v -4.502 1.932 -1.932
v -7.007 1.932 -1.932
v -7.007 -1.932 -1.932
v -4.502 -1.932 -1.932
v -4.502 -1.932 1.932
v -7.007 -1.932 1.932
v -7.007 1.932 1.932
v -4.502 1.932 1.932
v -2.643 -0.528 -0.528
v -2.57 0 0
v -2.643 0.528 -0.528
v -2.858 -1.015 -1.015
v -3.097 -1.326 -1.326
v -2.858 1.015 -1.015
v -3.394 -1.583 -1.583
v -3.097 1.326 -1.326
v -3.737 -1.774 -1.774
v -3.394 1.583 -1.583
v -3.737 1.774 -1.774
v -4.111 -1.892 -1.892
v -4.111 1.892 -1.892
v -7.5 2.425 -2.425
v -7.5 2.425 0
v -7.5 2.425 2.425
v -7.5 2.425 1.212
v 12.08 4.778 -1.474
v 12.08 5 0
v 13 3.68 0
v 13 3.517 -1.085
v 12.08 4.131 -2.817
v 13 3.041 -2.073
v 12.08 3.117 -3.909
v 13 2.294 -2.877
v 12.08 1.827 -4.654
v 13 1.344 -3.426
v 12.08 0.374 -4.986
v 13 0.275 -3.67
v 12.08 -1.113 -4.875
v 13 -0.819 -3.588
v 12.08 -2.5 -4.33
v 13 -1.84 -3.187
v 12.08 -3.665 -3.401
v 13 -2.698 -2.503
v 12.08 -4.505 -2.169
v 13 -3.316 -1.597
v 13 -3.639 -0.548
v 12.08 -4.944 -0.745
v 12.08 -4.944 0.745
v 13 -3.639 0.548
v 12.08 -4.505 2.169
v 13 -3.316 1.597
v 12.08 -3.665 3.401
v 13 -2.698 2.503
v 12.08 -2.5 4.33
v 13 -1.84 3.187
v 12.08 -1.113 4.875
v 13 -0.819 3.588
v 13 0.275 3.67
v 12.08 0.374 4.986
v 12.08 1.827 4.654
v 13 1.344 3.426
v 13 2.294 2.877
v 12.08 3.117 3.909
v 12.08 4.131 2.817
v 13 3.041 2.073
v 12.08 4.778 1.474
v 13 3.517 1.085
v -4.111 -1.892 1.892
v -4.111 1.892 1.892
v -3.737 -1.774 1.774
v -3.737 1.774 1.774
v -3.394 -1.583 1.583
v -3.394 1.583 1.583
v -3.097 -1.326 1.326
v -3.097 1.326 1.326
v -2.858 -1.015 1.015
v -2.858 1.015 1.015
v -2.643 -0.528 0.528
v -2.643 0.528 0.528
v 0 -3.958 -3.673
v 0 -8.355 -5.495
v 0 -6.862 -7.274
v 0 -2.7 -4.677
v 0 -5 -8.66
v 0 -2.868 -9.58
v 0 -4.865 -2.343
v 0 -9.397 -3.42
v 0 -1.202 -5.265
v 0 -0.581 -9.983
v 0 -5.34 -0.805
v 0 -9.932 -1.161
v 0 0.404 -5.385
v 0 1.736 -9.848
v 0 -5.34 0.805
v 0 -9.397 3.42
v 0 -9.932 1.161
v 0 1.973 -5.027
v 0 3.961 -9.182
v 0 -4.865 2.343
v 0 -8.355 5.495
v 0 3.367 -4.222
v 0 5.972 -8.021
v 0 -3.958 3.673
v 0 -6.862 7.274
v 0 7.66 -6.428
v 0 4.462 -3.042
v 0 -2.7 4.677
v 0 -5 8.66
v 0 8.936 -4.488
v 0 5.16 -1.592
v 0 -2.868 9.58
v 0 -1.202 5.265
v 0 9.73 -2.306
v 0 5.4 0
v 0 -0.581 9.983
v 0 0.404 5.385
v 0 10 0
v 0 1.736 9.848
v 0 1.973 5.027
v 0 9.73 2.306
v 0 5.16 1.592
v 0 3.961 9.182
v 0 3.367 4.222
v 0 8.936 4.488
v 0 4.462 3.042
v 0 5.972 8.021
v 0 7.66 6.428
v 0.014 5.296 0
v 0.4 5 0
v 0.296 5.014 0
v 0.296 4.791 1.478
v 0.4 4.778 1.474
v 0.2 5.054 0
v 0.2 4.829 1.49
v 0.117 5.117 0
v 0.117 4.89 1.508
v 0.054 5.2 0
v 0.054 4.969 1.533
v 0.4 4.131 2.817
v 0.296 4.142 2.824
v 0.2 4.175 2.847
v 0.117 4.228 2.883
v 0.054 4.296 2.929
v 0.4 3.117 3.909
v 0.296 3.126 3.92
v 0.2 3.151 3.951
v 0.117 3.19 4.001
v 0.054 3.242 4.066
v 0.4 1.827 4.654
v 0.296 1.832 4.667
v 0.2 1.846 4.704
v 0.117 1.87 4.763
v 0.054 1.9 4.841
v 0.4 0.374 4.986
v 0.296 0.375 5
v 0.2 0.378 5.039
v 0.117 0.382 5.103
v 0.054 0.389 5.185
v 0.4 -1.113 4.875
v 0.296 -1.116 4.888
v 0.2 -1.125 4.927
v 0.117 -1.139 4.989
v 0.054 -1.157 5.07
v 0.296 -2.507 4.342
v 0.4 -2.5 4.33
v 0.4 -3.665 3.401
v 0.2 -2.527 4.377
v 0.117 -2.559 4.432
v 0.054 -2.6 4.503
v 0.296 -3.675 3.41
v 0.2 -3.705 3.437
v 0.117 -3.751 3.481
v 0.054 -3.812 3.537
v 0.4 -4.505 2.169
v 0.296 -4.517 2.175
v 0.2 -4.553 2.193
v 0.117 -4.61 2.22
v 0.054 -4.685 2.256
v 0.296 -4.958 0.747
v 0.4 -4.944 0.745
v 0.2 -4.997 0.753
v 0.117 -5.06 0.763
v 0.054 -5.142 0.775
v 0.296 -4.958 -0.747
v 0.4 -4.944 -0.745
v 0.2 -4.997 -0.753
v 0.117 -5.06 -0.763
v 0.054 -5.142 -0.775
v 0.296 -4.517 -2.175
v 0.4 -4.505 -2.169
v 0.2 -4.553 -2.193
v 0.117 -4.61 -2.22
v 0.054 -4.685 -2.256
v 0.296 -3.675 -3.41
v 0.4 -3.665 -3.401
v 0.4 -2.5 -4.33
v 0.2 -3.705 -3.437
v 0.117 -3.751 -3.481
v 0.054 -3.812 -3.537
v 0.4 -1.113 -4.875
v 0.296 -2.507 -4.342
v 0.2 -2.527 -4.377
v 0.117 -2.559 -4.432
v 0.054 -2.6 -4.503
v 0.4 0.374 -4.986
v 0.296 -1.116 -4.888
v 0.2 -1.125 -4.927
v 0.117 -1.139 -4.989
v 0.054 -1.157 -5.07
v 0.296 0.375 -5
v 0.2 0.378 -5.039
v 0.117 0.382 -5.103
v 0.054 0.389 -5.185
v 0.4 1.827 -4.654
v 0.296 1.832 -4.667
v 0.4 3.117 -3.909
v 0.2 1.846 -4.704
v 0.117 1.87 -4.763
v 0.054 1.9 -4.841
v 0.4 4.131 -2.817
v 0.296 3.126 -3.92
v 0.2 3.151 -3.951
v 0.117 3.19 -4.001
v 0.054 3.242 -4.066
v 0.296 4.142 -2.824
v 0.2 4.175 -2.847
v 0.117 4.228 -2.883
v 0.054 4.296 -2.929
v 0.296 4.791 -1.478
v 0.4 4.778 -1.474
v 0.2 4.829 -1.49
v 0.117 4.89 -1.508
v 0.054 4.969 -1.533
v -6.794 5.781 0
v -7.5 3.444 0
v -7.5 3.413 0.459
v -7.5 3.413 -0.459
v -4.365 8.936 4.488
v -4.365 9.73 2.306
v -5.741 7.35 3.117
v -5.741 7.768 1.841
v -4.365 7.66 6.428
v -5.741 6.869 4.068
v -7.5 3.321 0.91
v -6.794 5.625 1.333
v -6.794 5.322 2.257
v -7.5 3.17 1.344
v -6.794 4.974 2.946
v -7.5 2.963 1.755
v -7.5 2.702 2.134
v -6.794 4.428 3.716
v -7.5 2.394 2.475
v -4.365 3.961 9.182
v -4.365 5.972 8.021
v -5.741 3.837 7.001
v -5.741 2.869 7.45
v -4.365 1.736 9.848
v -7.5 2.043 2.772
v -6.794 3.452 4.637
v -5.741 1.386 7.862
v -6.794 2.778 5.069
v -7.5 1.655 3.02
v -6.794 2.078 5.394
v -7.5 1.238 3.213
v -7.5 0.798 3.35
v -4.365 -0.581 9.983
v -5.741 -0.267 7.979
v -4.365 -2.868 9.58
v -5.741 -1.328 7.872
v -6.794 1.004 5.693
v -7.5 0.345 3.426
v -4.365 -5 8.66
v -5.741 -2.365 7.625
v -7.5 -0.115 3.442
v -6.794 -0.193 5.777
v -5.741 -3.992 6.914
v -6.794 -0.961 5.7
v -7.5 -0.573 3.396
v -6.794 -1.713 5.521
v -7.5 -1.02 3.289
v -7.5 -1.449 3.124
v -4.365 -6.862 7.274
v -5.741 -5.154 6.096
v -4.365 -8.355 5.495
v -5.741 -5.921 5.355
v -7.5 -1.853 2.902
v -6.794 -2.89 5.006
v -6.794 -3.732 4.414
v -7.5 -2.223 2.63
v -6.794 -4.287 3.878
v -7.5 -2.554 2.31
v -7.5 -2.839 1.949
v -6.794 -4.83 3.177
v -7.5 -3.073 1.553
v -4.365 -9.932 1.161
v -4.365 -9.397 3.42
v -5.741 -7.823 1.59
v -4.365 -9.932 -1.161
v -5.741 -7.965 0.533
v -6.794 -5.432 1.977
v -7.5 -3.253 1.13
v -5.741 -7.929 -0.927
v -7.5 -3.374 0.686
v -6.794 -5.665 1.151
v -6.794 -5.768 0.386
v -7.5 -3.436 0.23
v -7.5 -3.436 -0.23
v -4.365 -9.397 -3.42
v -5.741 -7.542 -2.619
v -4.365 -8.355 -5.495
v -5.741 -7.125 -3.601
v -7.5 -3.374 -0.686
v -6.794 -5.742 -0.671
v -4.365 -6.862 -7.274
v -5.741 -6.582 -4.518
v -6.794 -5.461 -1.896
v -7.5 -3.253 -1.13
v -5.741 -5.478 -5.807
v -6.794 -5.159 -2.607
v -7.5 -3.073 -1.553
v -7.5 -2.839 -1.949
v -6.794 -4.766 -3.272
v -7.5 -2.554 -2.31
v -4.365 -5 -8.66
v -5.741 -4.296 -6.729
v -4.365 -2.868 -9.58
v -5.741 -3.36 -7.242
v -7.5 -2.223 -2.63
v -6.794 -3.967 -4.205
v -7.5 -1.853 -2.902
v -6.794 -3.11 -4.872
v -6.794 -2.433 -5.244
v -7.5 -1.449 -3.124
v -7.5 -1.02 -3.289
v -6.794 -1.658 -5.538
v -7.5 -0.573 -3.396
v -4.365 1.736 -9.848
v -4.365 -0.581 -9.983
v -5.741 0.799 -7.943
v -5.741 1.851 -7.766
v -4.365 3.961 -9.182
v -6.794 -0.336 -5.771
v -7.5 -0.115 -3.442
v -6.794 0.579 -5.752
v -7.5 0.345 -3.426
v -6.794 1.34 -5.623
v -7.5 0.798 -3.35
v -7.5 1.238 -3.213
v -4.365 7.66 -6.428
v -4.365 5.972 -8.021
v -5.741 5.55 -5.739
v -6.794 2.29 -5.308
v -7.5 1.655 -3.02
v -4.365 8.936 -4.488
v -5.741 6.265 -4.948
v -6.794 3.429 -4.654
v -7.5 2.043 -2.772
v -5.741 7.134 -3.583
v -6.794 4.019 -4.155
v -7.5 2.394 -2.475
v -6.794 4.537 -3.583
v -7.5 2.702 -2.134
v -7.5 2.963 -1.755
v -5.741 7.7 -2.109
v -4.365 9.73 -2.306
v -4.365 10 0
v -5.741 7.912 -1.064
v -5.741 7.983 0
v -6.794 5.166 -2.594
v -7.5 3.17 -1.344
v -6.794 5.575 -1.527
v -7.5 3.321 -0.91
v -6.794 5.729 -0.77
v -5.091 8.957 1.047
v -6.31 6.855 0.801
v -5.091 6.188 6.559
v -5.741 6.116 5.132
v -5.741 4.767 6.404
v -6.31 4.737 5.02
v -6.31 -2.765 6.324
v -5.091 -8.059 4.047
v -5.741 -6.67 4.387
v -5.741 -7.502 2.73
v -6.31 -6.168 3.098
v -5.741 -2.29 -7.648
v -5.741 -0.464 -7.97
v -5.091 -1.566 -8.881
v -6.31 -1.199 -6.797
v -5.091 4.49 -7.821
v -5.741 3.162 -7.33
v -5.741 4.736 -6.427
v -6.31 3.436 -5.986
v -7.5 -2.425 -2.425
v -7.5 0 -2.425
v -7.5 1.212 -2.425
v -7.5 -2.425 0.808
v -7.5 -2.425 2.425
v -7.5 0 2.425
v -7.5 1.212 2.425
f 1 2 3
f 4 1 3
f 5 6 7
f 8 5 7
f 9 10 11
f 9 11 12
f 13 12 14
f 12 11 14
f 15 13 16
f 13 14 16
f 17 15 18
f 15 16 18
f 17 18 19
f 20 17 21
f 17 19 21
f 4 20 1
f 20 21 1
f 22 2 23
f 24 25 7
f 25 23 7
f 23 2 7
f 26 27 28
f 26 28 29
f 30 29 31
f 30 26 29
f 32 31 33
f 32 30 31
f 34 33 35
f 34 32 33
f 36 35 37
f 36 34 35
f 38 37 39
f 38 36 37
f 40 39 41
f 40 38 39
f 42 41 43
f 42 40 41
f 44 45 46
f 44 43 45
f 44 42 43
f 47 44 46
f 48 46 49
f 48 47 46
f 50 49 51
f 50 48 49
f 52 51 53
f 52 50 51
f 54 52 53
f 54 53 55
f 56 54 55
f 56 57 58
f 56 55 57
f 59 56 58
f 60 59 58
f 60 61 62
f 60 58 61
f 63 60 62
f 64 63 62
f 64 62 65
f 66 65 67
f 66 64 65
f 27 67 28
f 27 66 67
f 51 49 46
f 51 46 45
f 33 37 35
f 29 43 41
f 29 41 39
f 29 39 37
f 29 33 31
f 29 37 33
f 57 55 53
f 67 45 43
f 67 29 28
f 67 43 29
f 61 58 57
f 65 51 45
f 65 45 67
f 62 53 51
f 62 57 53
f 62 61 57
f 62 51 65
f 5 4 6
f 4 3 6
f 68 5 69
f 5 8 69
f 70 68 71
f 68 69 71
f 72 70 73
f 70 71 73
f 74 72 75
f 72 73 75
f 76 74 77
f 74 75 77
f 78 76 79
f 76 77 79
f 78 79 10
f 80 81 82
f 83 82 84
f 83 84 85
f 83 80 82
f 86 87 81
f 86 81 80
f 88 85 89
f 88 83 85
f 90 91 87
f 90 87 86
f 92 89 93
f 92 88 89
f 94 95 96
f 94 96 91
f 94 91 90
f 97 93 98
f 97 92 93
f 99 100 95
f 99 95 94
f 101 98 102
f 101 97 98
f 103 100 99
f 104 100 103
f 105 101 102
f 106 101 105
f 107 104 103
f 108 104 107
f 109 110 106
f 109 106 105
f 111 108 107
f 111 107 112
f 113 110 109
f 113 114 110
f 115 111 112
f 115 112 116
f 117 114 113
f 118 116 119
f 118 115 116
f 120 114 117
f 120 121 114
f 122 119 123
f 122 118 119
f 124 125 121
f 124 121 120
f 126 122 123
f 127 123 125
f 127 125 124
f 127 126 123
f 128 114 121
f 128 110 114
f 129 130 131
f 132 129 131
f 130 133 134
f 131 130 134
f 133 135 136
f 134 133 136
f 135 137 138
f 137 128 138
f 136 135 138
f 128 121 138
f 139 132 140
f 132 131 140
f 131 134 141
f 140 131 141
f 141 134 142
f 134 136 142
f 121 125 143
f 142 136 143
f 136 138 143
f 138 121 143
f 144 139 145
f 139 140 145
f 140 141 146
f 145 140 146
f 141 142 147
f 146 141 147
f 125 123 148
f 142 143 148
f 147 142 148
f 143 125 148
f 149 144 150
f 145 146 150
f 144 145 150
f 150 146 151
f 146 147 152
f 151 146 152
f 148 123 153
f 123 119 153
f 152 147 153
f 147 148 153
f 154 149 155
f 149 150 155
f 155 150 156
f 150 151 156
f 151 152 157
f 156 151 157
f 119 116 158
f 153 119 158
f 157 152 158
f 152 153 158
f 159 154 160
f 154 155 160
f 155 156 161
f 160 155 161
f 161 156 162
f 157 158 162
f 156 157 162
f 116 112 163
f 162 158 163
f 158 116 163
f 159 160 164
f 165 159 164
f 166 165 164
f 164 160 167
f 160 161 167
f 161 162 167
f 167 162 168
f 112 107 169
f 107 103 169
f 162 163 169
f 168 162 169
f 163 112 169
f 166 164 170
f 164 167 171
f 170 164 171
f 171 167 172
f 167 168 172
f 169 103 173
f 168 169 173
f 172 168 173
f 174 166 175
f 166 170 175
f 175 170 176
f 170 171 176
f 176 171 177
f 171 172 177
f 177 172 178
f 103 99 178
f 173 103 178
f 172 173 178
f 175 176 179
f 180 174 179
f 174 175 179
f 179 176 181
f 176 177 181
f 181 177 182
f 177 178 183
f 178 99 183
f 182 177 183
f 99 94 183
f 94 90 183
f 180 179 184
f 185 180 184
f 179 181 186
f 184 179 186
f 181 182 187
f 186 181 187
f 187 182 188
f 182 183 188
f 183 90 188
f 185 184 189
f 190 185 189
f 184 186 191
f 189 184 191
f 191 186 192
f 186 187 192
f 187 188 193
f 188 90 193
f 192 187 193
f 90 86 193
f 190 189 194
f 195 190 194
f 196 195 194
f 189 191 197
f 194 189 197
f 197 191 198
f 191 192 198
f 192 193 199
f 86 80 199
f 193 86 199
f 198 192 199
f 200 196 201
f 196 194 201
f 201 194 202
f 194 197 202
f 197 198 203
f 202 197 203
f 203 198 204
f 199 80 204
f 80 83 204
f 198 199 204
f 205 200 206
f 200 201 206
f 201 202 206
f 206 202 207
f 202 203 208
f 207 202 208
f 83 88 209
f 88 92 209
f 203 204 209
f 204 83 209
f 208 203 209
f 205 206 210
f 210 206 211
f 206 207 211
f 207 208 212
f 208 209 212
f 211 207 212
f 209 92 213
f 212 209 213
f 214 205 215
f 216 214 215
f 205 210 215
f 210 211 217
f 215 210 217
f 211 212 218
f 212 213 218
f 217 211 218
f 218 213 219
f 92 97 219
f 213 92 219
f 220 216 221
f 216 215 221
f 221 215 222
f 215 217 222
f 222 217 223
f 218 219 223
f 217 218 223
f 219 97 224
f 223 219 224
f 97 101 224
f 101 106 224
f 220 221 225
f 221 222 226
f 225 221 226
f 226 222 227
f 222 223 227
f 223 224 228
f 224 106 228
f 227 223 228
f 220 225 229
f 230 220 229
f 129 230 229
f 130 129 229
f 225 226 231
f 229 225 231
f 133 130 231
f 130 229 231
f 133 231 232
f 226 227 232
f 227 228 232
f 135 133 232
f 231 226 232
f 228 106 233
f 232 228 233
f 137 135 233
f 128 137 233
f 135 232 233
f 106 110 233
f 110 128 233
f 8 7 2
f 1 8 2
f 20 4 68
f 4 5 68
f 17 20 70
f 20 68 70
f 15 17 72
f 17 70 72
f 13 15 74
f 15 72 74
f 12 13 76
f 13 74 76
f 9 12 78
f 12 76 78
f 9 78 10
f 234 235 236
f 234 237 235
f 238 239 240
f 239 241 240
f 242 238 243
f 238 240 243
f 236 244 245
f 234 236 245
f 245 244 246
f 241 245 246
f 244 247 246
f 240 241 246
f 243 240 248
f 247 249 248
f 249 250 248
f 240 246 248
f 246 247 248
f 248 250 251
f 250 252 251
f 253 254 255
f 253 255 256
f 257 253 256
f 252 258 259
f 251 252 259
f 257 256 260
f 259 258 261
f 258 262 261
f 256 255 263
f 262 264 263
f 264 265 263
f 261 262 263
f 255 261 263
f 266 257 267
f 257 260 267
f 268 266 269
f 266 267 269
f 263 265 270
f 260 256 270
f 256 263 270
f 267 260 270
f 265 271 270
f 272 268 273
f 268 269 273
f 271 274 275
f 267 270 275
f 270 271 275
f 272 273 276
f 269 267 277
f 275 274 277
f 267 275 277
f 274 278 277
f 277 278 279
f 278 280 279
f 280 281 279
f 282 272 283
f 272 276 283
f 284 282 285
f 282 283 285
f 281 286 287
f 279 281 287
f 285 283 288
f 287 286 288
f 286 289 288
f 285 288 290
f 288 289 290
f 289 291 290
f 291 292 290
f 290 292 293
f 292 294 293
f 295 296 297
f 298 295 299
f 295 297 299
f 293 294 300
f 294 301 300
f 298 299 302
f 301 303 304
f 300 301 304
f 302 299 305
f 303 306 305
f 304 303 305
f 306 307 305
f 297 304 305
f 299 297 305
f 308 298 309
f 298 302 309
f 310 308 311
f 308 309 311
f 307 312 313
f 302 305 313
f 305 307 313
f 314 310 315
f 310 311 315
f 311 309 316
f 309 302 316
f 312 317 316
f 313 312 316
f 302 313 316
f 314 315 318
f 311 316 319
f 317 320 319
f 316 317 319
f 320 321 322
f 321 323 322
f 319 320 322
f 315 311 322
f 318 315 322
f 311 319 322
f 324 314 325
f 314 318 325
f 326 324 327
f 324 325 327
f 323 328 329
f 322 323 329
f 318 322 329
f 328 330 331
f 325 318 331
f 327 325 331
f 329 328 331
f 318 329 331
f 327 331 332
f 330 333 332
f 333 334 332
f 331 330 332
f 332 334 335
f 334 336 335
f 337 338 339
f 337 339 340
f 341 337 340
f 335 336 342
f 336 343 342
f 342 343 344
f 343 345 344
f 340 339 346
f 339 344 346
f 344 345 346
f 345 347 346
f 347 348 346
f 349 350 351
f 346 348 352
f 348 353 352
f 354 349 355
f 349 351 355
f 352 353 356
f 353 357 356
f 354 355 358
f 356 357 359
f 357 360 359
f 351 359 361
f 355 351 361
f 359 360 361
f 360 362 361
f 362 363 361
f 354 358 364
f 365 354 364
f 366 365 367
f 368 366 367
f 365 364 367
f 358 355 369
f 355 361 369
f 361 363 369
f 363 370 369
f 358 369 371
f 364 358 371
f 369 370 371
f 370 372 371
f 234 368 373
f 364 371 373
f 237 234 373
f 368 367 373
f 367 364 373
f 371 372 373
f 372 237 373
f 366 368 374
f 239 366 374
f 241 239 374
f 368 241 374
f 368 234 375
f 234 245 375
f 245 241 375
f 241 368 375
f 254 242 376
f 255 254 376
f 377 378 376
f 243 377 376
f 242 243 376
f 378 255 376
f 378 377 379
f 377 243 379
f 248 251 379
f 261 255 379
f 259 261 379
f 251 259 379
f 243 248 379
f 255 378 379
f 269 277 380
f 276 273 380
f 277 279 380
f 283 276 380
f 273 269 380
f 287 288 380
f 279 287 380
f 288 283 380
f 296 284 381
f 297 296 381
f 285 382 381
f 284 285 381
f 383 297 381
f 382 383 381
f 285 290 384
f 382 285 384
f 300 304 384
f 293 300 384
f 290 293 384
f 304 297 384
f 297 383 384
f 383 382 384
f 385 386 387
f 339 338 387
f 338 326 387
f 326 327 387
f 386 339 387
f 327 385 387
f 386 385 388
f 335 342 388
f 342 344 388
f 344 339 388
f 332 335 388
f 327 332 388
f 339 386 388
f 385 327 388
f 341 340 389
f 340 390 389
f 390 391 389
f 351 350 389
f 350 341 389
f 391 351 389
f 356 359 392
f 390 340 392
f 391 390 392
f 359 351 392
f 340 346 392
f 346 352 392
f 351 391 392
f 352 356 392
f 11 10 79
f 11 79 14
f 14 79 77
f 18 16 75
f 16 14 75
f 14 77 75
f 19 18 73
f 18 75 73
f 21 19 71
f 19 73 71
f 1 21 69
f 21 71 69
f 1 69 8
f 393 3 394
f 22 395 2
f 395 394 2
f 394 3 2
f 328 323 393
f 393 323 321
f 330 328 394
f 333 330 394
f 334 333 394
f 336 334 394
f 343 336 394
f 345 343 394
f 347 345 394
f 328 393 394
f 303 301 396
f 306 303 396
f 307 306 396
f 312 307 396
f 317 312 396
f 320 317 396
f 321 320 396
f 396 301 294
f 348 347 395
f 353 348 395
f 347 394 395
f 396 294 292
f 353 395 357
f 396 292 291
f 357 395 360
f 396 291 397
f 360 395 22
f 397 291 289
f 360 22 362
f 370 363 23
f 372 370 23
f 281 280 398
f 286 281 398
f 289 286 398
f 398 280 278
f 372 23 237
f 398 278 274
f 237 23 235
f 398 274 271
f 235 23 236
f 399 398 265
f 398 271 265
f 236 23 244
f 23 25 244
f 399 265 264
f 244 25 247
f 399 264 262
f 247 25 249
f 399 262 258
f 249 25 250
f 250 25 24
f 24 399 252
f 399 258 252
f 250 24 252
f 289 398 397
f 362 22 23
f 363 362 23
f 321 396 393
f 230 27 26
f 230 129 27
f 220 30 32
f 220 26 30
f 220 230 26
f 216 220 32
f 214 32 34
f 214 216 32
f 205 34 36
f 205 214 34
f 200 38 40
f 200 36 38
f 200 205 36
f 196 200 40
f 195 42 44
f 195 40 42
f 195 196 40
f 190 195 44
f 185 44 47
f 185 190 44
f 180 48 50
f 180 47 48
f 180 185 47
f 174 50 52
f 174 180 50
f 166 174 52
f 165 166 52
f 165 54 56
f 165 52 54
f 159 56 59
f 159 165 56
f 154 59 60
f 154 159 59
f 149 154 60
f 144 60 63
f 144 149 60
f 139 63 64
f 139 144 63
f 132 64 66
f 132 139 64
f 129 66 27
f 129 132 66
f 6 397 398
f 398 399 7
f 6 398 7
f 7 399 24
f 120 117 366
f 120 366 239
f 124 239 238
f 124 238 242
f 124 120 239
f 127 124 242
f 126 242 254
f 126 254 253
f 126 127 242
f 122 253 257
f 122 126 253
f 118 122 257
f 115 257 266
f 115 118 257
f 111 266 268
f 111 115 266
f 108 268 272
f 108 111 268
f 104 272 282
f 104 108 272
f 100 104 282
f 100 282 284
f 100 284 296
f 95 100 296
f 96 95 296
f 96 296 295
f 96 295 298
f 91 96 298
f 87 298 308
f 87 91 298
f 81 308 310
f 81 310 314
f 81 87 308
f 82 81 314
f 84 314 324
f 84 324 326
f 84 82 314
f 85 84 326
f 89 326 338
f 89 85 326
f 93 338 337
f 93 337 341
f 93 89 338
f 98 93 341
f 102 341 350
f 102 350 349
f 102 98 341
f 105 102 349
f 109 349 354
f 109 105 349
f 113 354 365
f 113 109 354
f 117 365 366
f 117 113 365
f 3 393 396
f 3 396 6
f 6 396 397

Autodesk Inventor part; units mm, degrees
ref_plane "YZ Plane" through (0, 0, 0) normal (1, 0, 0) x (0, 1, 0)
sketch "Skizze1" plane through (0, 0, 0) normal (0, 0, 1) x (1, 0, 0)
  line L0 (-2.57, 0) -> (13, 0)
  line L1 (13, 0) -> (13, 5)
  line L2 (13, 5) -> (0, 5)
  line L3 (0, 5) -> (0, 10)
  line L4 (-12.0526, 0) -> (17.1754, 0) projected
  line L5 (0, -2.0361) -> (0, 12.2164) projected
  line L6 (-7.5, 3.4435) -> (-5.0836, 3.4435) construction
  line L7 (-7.5, 0) -> (-2.57, 0)
  line L8 (0, 0) -> (-2.57, 0)
  line L9 (-7.5, 0) -> (-7.5, 10)
  arc A0 (-4.3649, 10) -> (-7.5, 3.4435) centre (8.1251, 0) ccw
  line L10 (-7.5, 10) -> (0, 10)
  dimension "d0" = 13
  dimension "d1" = 10
  dimension "d2" = 20
  dimension "d4" = 6.887
  dimension "d13" = 7.5
  dimension "d14" = 4.93
  dimension "d46" = 16
  dimension "d47" = 0
revolve "Körper" add sketch "Skizze1" angle 360 about axis through (-2.57, 0, 0) along (1, 0, 0) contours L4 L9 A0 L10 L3 L5 L0 | L5 L2 L1 L0
ref_plane "IDS_WORKPLANE{1}" through (-7.5, 0, 0) normal (1, 0, 0) x (0, 0, -1)
sketch "Skizze2" plane through (-7.5, 0, 0) normal (1, 0, 0) x (0, 0, -1)
  line L0 (0, -14) -> (0, 14) projected
  line L1 (14, 0) -> (-14, 0) projected
  line L2 (-1.932, 1.932) -> (1.932, 1.932)
  line L3 (1.932, 1.932) -> (1.932, -1.932)
  line L4 (1.932, -1.932) -> (-1.932, -1.932)
  line L5 (-1.932, -1.932) -> (-1.932, 1.932)
  line L6 (0, 1.932) -> (0, -1.932) construction
  line L7 (-1.932, 0) -> (1.932, 0) construction
  dimension "d7" = 3.864
  dimension "d9" = 3.864
extrude "Extrusion" cut sketch "Skizze2" along normal blind 4.93
fillet "Rundung1" radius 1.932 4 edges at (-2.57, 0, -1.932) (-2.57, -1.932, 0) (-2.57, 0, 1.932) (-2.57, 1.932, 0)
chamfer "Fase1" distance 0.493 angle 45 4 edges at (-7.5, 1.932, 0) (-7.5, 0, -1.932) (-7.5, -1.932, 0) (-7.5, 0, 1.932)
thread "Gewinde" size "M10x1.5" class "6g" standard "ISO Metric profile" length 11.5
chamfer "Fase2" distance 1.32 distance2 0.9202 1 edges at (13, -5, 0) measured on face at (13, -0.8193, -0.3214)
ref_plane "Work Plane2" through (69.85, 0, 0) normal (0, 0, -1) x (1, 0, 0)
fillet "Rundung2" radius 0.4 1 edges at (0, -5, 0)
equation "\"d7\" = KOM - 0.2 * STI"
equation "\"d9\" = KOM - 0.2 * STI"
equation "\"d0\" = NLG"
equation "\"d1\" = GD"
equation "\"d2\" = KOD"
equation "\"d4\" = 1.42 * KOM"
equation "\"d13\" = KOH"
equation "\"d14\" = STI"
equation "\"d46\" = KR"
equation "\"d48\" = STI"
equation "\"d50\" = -0.1 * STI + 0.5 * KOM"
equation "\"d51\" = 0.1 * STI"
equation "\"d18\" = GEL"
equation "\"d20\" = -0.5 * SPD + 0.5 * GD"
equation "\"d21\" = GUL"
equation "\"d44\" = R"
equation "\"GD\" = 10"
equation "\"NLG\" = 13"
equation "\"GEL\" = 11.5"
equation "\"KOD\" = 20"
equation "\"KOH\" = 7.5"
equation "\"SPD\" = 7.36"
equation "\"KR\" = 16"
equation "\"RR\" = 3.2"
equation "\"GUL\" = 0.61345 * PTC"
equation "\"KEWI\" = 0"
equation "\"SDM\" = 4.86"
equation "\"STI\" = 4.93"
equation "\"d6\" = -KOH"
equation "\"R\" = 0.4"
equation "\"KOM\" = 4.85"
equation "\"KOP\" = 16"
equation "\"PTC\" = 1.5"
properties part number "ANSI B18.6.7M - M10x1,5 x 13, SRPHMSTIM" material "Stahl, weich"
